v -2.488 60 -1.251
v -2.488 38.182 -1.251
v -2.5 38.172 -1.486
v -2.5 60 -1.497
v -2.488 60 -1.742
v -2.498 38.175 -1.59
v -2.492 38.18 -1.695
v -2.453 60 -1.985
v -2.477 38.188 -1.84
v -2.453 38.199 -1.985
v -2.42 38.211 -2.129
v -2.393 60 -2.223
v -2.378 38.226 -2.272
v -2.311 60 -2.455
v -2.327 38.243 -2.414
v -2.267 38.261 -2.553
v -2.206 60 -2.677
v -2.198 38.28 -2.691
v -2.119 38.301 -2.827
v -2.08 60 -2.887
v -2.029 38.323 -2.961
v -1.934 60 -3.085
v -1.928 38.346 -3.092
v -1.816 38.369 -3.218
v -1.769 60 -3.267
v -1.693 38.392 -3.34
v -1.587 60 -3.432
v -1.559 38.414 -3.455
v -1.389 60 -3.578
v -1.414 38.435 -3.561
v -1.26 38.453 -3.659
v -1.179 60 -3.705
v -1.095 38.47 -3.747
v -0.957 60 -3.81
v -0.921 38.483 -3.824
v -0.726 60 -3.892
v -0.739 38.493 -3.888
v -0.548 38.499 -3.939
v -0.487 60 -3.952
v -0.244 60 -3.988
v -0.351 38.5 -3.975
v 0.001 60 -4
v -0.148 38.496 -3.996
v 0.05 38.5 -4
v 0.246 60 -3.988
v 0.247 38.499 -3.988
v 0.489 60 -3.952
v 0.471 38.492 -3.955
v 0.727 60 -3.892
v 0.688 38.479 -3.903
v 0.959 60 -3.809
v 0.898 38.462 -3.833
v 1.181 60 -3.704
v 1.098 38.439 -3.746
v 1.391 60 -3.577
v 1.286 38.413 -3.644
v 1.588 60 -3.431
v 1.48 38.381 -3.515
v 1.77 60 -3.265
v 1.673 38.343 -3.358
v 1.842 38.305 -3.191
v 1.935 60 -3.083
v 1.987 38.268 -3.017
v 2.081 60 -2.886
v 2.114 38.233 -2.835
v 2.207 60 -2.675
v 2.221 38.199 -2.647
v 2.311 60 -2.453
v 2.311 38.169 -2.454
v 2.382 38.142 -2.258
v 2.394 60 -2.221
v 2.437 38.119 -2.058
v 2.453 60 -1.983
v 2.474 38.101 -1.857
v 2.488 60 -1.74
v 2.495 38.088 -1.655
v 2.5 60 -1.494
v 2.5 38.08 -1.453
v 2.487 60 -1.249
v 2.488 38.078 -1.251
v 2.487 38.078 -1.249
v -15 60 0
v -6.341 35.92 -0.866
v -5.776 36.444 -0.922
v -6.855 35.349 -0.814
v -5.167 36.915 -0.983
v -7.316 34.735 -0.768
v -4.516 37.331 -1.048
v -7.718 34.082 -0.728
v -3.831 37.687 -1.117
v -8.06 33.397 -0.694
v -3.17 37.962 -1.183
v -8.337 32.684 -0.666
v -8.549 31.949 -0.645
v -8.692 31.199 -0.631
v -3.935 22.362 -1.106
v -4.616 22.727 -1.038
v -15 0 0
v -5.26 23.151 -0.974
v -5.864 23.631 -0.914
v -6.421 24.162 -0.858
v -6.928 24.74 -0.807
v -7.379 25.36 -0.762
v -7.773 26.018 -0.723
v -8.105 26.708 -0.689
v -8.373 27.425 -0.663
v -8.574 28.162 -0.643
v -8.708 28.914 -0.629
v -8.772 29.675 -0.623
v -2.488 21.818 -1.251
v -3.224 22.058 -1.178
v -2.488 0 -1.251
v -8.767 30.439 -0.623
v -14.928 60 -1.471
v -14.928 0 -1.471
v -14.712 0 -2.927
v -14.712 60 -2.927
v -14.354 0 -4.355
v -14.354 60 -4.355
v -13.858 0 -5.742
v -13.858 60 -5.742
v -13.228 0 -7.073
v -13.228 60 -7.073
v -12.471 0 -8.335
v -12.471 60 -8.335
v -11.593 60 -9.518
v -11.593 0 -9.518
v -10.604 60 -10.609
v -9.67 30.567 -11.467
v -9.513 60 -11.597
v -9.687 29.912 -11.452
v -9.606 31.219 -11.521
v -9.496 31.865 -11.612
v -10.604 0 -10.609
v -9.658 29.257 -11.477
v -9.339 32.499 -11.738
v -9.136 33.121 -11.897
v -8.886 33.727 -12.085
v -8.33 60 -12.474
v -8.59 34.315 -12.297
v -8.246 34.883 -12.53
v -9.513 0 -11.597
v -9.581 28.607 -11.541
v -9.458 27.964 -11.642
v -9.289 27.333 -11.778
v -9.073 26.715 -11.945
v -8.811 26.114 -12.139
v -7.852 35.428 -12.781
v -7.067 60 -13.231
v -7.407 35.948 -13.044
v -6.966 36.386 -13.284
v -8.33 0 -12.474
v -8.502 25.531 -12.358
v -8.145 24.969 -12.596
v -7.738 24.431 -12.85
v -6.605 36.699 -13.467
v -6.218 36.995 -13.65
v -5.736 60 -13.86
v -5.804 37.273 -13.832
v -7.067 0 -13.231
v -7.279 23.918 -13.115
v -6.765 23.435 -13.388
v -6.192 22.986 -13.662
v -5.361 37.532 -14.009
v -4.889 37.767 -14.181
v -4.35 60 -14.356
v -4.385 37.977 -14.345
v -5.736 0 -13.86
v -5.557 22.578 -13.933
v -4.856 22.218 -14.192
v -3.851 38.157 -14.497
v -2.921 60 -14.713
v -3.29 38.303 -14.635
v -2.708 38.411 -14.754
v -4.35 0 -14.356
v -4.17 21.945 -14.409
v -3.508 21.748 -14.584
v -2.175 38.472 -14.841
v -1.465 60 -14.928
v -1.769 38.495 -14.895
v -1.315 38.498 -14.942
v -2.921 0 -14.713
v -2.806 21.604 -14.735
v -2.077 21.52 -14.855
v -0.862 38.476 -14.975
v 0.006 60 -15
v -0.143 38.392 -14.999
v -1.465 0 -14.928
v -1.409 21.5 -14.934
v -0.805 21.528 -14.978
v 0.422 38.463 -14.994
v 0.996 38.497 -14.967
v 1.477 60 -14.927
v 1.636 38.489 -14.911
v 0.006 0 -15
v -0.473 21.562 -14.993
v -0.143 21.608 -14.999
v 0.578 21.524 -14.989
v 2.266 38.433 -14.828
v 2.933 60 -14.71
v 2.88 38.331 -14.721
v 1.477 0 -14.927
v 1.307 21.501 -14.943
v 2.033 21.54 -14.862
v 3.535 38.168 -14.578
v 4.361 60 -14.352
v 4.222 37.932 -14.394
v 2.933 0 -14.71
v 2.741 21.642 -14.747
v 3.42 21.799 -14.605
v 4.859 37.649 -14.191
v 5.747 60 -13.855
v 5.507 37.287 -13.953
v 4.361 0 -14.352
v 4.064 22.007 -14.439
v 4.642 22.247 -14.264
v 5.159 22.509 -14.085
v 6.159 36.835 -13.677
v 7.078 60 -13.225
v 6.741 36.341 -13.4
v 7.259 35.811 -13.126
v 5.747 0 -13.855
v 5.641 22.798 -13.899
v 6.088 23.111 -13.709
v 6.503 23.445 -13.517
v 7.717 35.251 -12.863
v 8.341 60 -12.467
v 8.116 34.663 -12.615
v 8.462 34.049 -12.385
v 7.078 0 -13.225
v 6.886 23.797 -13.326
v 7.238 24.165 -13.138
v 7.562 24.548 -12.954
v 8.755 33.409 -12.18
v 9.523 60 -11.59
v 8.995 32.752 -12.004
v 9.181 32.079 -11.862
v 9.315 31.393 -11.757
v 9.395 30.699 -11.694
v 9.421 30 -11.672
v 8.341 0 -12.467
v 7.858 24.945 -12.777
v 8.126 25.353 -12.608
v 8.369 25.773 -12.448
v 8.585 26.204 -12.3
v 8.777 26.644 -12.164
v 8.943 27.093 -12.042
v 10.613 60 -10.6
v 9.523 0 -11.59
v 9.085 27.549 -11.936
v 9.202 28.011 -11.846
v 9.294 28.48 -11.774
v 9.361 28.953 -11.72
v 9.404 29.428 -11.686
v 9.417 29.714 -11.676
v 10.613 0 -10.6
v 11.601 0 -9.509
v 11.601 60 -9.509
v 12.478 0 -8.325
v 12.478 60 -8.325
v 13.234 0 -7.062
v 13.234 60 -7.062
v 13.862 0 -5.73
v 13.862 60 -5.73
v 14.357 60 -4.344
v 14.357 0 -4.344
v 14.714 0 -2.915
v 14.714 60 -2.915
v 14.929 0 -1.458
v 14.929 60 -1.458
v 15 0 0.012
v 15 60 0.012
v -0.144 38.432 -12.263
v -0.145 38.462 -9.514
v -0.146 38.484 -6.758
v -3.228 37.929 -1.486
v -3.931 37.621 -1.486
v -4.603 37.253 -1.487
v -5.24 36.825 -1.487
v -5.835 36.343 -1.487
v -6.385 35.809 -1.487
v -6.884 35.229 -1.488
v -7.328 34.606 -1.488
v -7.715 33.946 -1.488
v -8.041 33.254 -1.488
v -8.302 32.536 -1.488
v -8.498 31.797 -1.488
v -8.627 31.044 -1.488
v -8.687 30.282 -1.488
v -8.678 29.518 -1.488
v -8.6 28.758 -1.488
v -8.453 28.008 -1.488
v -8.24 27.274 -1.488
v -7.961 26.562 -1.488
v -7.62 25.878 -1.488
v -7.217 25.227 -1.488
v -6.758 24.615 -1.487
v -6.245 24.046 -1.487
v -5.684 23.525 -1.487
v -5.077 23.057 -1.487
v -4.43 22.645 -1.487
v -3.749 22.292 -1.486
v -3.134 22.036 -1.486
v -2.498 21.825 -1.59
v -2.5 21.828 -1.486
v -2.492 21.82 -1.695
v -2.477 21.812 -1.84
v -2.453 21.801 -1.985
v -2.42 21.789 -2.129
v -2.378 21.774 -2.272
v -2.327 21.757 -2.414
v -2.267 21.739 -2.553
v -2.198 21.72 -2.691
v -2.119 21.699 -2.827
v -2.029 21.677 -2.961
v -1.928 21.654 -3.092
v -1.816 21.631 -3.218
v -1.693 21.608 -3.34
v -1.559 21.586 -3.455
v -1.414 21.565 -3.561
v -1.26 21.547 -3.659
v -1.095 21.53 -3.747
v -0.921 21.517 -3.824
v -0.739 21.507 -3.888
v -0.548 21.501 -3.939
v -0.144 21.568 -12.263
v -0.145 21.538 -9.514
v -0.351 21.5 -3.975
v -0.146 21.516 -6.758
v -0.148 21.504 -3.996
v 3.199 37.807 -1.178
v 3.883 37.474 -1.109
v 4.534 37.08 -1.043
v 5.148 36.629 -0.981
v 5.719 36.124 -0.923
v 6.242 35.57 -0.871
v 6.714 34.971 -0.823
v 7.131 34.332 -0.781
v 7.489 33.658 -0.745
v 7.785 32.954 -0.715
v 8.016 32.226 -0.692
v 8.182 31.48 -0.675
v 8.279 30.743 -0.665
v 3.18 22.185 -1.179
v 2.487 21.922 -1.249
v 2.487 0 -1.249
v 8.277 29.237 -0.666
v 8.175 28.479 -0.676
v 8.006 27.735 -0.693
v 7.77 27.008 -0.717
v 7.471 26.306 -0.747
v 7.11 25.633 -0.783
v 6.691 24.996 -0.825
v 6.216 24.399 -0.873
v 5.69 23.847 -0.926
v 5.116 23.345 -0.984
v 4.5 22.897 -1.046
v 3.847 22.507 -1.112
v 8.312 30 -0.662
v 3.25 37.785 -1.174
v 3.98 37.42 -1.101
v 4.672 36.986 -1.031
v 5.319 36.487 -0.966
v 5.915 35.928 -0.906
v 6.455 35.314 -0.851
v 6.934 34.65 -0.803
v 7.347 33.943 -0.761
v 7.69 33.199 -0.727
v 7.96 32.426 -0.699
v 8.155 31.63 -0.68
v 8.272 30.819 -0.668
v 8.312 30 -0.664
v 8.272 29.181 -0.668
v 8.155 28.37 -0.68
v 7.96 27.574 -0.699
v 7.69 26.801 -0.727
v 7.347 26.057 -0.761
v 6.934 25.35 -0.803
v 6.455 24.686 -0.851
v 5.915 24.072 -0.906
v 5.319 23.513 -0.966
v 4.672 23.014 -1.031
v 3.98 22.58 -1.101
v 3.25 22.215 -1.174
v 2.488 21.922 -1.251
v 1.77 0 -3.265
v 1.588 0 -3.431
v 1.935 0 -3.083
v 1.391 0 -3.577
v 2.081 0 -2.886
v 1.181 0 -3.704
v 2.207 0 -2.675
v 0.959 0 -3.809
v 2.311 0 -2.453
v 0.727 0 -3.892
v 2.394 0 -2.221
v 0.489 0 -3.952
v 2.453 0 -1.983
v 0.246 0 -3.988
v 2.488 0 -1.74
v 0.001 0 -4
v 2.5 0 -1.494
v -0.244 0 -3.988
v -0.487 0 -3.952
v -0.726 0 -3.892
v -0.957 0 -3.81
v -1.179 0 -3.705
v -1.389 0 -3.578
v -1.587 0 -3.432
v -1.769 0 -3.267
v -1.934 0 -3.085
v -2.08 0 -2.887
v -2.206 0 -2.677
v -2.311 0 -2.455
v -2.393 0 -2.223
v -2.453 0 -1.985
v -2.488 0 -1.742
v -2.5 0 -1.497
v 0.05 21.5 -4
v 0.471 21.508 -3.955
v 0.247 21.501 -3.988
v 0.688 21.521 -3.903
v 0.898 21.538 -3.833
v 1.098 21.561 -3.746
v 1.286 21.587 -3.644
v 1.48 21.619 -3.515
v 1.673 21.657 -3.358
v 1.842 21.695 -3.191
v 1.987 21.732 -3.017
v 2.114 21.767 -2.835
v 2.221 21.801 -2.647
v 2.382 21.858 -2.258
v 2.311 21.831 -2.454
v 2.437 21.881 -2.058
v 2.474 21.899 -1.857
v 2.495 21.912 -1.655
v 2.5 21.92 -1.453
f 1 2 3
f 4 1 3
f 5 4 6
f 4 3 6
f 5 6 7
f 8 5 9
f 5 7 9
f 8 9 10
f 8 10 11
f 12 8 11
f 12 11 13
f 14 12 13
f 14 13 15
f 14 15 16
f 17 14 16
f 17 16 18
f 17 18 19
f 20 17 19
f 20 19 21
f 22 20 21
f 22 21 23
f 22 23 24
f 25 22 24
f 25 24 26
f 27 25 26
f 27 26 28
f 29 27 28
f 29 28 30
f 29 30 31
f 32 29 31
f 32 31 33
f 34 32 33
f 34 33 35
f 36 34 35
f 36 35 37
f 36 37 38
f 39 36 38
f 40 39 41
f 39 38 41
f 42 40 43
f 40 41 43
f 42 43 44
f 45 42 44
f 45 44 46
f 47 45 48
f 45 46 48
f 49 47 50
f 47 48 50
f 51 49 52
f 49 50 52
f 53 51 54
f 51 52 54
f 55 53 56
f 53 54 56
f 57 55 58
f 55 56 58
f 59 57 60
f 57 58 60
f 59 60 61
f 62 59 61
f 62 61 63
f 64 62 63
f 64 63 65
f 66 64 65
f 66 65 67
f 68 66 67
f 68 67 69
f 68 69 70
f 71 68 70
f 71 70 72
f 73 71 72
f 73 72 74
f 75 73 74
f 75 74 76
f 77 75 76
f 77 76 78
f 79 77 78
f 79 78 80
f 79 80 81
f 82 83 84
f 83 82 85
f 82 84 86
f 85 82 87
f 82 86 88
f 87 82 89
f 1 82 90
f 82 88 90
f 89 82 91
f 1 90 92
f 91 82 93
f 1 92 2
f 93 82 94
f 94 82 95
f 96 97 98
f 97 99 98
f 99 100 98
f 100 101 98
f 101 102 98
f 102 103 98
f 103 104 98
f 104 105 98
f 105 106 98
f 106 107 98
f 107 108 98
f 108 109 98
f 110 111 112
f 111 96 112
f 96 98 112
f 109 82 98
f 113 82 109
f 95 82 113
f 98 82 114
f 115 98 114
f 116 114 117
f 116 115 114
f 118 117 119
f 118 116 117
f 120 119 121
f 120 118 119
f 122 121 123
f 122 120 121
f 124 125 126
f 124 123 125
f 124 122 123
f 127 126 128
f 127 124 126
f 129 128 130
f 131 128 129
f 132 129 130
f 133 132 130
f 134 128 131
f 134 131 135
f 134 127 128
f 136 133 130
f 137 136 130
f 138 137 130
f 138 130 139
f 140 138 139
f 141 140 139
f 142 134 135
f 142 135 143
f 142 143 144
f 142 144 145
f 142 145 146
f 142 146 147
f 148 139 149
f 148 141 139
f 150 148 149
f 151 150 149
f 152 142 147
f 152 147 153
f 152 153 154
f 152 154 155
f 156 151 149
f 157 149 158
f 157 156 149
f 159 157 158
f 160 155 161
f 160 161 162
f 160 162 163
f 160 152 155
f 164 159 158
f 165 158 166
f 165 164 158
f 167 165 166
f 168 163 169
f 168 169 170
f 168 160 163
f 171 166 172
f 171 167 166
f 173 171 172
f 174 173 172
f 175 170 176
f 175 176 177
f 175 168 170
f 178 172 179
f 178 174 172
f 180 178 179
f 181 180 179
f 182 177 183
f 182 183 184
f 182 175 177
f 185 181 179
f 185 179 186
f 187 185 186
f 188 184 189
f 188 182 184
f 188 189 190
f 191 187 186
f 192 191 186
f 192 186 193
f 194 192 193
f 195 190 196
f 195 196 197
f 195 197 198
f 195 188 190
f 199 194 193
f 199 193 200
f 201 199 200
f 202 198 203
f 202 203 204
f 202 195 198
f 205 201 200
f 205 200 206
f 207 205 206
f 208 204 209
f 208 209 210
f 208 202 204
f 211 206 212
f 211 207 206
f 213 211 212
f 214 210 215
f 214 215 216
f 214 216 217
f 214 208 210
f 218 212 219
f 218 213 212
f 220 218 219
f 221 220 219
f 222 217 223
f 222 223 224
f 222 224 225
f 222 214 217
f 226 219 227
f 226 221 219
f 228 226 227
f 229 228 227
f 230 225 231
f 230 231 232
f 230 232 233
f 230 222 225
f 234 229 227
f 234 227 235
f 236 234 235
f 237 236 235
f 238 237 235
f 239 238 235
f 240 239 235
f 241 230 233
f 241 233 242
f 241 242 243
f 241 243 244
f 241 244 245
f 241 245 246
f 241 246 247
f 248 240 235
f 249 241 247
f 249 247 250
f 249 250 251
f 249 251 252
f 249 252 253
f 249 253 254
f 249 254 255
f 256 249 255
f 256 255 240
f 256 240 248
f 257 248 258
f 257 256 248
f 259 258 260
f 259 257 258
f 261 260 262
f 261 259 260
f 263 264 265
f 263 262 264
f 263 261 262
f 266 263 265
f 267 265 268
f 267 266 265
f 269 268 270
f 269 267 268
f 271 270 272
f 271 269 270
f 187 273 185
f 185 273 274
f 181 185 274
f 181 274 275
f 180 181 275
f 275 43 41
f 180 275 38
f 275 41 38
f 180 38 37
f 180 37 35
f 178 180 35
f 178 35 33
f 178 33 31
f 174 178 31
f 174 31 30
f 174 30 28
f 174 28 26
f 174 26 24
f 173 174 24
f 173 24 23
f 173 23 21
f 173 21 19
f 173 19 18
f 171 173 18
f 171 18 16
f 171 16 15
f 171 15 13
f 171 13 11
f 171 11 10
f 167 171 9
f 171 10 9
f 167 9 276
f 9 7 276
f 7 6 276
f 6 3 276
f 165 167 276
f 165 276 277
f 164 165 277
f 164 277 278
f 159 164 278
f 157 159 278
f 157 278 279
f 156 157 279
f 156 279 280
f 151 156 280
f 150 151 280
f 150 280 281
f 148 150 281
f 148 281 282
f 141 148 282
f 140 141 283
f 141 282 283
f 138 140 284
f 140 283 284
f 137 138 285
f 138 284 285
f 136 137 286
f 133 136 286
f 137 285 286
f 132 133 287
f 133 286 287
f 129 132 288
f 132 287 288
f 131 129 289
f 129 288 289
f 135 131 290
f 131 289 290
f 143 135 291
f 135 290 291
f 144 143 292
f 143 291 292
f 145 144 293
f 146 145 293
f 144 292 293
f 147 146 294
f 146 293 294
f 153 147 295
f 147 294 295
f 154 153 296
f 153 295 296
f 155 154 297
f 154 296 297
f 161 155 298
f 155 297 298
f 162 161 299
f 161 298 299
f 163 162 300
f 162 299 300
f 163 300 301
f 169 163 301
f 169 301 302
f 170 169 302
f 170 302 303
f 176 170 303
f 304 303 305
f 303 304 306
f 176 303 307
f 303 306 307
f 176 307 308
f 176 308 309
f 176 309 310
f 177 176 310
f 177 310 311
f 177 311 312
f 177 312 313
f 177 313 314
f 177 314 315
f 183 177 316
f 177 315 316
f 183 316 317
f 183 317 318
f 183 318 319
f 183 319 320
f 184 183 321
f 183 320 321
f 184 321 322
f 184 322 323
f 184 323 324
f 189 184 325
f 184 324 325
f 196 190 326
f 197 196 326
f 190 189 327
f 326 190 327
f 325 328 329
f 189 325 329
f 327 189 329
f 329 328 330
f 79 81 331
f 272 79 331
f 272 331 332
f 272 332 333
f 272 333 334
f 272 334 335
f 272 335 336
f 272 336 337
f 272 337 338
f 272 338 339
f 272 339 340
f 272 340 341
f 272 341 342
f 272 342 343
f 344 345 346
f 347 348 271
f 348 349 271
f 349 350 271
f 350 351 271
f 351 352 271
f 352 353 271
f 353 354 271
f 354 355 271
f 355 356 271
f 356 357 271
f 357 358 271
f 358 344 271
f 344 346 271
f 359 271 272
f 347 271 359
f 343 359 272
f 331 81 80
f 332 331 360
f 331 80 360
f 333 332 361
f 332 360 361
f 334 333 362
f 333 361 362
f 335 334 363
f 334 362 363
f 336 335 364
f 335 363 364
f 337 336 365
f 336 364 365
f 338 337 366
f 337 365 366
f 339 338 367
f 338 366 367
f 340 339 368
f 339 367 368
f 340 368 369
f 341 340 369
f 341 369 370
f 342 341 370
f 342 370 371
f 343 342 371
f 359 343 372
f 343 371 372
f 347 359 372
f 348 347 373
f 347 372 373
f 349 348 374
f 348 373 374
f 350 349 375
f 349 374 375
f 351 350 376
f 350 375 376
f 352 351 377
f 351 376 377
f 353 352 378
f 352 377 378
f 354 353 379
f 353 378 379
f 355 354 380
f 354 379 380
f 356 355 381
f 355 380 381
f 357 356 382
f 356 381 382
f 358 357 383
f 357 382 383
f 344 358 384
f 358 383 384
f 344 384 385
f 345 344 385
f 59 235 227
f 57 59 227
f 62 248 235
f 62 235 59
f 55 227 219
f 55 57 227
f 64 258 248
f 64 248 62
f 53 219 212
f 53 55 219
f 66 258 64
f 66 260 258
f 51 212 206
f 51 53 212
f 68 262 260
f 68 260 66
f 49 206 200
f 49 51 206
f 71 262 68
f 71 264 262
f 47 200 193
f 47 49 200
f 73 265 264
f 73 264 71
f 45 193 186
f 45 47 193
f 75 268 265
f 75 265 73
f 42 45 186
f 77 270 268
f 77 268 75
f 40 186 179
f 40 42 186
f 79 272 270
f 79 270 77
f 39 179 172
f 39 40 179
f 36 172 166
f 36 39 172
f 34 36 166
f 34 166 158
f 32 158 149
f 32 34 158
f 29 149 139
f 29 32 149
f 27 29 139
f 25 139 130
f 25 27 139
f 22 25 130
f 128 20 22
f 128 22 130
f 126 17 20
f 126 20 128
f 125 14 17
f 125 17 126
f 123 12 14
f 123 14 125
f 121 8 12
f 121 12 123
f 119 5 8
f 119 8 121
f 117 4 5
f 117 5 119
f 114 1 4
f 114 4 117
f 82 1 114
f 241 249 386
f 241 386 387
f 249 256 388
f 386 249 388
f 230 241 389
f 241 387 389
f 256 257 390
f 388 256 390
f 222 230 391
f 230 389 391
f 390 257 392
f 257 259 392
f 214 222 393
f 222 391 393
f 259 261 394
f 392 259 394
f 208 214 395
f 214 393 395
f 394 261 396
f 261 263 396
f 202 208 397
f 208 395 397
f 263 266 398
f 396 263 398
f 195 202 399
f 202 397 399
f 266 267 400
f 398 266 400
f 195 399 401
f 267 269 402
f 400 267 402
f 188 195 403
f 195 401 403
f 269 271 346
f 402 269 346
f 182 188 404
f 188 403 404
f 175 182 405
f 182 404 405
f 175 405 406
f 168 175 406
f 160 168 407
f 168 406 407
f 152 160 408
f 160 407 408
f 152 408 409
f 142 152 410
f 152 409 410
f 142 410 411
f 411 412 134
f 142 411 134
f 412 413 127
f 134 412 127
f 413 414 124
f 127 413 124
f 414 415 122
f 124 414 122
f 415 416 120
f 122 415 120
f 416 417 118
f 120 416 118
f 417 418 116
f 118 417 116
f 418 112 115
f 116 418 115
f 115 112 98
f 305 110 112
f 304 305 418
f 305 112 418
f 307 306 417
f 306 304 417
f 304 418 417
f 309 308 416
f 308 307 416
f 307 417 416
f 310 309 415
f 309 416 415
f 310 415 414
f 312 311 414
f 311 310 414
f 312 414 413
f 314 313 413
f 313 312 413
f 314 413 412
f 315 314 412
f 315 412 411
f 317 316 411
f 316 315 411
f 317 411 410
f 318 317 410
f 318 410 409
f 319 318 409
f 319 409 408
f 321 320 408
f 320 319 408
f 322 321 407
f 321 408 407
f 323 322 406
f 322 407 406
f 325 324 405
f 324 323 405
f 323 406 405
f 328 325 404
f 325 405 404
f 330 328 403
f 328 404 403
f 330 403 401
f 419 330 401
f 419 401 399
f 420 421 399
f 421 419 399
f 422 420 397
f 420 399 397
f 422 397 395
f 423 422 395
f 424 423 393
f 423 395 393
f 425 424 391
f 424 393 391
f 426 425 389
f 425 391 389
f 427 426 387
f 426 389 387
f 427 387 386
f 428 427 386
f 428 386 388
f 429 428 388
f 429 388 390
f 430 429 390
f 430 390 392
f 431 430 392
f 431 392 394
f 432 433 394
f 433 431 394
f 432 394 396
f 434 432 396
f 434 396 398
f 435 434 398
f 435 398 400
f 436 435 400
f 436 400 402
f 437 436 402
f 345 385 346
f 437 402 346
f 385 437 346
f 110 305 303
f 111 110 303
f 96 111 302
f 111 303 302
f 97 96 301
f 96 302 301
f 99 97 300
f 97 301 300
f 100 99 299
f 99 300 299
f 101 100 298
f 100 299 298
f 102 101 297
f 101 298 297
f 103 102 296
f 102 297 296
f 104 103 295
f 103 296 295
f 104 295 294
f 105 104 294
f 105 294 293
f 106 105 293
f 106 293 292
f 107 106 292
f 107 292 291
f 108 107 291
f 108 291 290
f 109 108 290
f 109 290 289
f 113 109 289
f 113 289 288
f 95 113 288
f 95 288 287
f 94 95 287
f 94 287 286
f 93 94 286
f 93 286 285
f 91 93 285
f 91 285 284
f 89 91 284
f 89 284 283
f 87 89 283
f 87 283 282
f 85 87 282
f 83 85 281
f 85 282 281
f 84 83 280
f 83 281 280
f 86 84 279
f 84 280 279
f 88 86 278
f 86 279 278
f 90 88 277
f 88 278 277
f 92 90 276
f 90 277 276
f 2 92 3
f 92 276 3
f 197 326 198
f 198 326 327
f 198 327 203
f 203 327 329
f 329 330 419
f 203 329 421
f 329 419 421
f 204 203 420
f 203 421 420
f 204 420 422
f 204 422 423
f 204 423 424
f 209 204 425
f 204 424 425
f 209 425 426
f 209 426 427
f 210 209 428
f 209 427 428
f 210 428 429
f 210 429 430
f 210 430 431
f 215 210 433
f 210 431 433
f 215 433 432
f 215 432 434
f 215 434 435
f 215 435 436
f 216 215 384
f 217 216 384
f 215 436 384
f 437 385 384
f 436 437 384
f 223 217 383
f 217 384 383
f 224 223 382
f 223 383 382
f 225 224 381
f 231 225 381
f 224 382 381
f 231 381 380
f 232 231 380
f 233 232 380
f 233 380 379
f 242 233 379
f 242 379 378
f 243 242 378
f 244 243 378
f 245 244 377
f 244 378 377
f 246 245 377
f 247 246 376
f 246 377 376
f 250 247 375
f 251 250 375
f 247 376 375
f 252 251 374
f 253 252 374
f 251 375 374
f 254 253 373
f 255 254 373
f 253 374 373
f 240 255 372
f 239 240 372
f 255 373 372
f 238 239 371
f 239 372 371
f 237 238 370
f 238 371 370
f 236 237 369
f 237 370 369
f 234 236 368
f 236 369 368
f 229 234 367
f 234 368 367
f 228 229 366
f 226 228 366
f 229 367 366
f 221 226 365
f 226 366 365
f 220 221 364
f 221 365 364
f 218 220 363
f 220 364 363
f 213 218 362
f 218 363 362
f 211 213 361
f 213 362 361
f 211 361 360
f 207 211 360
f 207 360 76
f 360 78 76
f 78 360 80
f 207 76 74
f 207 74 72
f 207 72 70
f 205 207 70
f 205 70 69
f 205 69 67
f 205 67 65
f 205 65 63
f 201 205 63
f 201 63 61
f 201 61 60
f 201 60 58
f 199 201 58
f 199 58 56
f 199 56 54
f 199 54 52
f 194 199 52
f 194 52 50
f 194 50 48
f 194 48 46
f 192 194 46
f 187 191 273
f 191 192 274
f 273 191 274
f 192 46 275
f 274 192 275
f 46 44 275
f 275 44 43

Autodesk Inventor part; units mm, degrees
ref_plane "YZ Plane" through (0, 0, 0) normal (1, 0, 0) x (0, 1, 0)
ref_plane "XZ Plane" through (0, 0, 0) normal (0, 1, 0) x (-1, 0, 0)
ref_plane "XY Plane" through (0, 0, 0) normal (0, 0, 1) x (1, 0, 0)
sketch "Sketch1" plane through (0, 0, 0) normal (0, 1, 0) x (-1, 0, 0)
  point P0 (0, 0)
sketch "Sketch2" plane through (0, 0, 0) normal (0, 1, 0) x (-1, 0, 0)
  arc A0 (-15, 0.0122) -> (15, 0) centre (0, 0) ccw
  line L0 (15, 0) -> (2.4876, -1.2512)
  line L1 (-2.4874, -1.2492) -> (-15, 0.0122)
  arc A1 (-2.4874, -1.2492) -> (2.4876, -1.2512) centre (0, -1.5) ccw
  dimension "d0" = 1.5
  dimension "d1" = 30
  dimension "d2" = 5
extrude "Extrusion1" add sketch "Sketch2" along normal blind 60
sketch "Sketch3" plane through (-2.4876, 0, -1.2512) normal (0.0995, 0, 0.995) x (0.995, 0, -0.0995)
  circle A0 centre (2.3507, 30) radius 8.5
  line L0 (17.2751, 0) -> (17.2751, 60) projected
  point P0 (2.3507, 0)
  point P1 (17.2751, 30)
  dimension "d5" = 17
extrude "Extrusion2" cut sketch "Sketch3" against normal blind 35
sketch "Sketch4" plane through (15, 0, 0.0122) normal (-0.1003, 0, 0.995) x (0.995, 0, 0.1003)
  ellipse E0 centre (-15.2223, 30) end of major axis (-15.2223, 38.5) minor radius 8.3303 (-12.6259, 21.9234) -> (-12.6259, 38.0766) ccw projected
  circle A0 centre (-15.2223, 30) radius 8.5
  point P0 (-14.9256, 0)
extrude "Extrusion3" cut sketch "Sketch4" along normal blind 35
sketch "Sketch5" plane through (2.4874, 0, -1.2492) normal (-0.1003, 0, 0.995) x (0.995, 0, 0.1003)
  ellipse E0 centre (-2.6463, 30) end of major axis (-2.6463, 38.5) minor radius 8.3303 (-0.0499, 21.9234) -> (-0.0499, 38.0766) ccw projected
  circle A0 centre (-2.6463, 30) radius 8.5
  point P0 (-2.3495, 0)
extrude "Extrusion4" cut sketch "Sketch5" against normal blind 35
sketch "Sketch6" plane through (0, 0, 0) normal (0, -1, 0) x (1, 0, 0)
  point P0 (0, 0)
properties part number "joy part1"
